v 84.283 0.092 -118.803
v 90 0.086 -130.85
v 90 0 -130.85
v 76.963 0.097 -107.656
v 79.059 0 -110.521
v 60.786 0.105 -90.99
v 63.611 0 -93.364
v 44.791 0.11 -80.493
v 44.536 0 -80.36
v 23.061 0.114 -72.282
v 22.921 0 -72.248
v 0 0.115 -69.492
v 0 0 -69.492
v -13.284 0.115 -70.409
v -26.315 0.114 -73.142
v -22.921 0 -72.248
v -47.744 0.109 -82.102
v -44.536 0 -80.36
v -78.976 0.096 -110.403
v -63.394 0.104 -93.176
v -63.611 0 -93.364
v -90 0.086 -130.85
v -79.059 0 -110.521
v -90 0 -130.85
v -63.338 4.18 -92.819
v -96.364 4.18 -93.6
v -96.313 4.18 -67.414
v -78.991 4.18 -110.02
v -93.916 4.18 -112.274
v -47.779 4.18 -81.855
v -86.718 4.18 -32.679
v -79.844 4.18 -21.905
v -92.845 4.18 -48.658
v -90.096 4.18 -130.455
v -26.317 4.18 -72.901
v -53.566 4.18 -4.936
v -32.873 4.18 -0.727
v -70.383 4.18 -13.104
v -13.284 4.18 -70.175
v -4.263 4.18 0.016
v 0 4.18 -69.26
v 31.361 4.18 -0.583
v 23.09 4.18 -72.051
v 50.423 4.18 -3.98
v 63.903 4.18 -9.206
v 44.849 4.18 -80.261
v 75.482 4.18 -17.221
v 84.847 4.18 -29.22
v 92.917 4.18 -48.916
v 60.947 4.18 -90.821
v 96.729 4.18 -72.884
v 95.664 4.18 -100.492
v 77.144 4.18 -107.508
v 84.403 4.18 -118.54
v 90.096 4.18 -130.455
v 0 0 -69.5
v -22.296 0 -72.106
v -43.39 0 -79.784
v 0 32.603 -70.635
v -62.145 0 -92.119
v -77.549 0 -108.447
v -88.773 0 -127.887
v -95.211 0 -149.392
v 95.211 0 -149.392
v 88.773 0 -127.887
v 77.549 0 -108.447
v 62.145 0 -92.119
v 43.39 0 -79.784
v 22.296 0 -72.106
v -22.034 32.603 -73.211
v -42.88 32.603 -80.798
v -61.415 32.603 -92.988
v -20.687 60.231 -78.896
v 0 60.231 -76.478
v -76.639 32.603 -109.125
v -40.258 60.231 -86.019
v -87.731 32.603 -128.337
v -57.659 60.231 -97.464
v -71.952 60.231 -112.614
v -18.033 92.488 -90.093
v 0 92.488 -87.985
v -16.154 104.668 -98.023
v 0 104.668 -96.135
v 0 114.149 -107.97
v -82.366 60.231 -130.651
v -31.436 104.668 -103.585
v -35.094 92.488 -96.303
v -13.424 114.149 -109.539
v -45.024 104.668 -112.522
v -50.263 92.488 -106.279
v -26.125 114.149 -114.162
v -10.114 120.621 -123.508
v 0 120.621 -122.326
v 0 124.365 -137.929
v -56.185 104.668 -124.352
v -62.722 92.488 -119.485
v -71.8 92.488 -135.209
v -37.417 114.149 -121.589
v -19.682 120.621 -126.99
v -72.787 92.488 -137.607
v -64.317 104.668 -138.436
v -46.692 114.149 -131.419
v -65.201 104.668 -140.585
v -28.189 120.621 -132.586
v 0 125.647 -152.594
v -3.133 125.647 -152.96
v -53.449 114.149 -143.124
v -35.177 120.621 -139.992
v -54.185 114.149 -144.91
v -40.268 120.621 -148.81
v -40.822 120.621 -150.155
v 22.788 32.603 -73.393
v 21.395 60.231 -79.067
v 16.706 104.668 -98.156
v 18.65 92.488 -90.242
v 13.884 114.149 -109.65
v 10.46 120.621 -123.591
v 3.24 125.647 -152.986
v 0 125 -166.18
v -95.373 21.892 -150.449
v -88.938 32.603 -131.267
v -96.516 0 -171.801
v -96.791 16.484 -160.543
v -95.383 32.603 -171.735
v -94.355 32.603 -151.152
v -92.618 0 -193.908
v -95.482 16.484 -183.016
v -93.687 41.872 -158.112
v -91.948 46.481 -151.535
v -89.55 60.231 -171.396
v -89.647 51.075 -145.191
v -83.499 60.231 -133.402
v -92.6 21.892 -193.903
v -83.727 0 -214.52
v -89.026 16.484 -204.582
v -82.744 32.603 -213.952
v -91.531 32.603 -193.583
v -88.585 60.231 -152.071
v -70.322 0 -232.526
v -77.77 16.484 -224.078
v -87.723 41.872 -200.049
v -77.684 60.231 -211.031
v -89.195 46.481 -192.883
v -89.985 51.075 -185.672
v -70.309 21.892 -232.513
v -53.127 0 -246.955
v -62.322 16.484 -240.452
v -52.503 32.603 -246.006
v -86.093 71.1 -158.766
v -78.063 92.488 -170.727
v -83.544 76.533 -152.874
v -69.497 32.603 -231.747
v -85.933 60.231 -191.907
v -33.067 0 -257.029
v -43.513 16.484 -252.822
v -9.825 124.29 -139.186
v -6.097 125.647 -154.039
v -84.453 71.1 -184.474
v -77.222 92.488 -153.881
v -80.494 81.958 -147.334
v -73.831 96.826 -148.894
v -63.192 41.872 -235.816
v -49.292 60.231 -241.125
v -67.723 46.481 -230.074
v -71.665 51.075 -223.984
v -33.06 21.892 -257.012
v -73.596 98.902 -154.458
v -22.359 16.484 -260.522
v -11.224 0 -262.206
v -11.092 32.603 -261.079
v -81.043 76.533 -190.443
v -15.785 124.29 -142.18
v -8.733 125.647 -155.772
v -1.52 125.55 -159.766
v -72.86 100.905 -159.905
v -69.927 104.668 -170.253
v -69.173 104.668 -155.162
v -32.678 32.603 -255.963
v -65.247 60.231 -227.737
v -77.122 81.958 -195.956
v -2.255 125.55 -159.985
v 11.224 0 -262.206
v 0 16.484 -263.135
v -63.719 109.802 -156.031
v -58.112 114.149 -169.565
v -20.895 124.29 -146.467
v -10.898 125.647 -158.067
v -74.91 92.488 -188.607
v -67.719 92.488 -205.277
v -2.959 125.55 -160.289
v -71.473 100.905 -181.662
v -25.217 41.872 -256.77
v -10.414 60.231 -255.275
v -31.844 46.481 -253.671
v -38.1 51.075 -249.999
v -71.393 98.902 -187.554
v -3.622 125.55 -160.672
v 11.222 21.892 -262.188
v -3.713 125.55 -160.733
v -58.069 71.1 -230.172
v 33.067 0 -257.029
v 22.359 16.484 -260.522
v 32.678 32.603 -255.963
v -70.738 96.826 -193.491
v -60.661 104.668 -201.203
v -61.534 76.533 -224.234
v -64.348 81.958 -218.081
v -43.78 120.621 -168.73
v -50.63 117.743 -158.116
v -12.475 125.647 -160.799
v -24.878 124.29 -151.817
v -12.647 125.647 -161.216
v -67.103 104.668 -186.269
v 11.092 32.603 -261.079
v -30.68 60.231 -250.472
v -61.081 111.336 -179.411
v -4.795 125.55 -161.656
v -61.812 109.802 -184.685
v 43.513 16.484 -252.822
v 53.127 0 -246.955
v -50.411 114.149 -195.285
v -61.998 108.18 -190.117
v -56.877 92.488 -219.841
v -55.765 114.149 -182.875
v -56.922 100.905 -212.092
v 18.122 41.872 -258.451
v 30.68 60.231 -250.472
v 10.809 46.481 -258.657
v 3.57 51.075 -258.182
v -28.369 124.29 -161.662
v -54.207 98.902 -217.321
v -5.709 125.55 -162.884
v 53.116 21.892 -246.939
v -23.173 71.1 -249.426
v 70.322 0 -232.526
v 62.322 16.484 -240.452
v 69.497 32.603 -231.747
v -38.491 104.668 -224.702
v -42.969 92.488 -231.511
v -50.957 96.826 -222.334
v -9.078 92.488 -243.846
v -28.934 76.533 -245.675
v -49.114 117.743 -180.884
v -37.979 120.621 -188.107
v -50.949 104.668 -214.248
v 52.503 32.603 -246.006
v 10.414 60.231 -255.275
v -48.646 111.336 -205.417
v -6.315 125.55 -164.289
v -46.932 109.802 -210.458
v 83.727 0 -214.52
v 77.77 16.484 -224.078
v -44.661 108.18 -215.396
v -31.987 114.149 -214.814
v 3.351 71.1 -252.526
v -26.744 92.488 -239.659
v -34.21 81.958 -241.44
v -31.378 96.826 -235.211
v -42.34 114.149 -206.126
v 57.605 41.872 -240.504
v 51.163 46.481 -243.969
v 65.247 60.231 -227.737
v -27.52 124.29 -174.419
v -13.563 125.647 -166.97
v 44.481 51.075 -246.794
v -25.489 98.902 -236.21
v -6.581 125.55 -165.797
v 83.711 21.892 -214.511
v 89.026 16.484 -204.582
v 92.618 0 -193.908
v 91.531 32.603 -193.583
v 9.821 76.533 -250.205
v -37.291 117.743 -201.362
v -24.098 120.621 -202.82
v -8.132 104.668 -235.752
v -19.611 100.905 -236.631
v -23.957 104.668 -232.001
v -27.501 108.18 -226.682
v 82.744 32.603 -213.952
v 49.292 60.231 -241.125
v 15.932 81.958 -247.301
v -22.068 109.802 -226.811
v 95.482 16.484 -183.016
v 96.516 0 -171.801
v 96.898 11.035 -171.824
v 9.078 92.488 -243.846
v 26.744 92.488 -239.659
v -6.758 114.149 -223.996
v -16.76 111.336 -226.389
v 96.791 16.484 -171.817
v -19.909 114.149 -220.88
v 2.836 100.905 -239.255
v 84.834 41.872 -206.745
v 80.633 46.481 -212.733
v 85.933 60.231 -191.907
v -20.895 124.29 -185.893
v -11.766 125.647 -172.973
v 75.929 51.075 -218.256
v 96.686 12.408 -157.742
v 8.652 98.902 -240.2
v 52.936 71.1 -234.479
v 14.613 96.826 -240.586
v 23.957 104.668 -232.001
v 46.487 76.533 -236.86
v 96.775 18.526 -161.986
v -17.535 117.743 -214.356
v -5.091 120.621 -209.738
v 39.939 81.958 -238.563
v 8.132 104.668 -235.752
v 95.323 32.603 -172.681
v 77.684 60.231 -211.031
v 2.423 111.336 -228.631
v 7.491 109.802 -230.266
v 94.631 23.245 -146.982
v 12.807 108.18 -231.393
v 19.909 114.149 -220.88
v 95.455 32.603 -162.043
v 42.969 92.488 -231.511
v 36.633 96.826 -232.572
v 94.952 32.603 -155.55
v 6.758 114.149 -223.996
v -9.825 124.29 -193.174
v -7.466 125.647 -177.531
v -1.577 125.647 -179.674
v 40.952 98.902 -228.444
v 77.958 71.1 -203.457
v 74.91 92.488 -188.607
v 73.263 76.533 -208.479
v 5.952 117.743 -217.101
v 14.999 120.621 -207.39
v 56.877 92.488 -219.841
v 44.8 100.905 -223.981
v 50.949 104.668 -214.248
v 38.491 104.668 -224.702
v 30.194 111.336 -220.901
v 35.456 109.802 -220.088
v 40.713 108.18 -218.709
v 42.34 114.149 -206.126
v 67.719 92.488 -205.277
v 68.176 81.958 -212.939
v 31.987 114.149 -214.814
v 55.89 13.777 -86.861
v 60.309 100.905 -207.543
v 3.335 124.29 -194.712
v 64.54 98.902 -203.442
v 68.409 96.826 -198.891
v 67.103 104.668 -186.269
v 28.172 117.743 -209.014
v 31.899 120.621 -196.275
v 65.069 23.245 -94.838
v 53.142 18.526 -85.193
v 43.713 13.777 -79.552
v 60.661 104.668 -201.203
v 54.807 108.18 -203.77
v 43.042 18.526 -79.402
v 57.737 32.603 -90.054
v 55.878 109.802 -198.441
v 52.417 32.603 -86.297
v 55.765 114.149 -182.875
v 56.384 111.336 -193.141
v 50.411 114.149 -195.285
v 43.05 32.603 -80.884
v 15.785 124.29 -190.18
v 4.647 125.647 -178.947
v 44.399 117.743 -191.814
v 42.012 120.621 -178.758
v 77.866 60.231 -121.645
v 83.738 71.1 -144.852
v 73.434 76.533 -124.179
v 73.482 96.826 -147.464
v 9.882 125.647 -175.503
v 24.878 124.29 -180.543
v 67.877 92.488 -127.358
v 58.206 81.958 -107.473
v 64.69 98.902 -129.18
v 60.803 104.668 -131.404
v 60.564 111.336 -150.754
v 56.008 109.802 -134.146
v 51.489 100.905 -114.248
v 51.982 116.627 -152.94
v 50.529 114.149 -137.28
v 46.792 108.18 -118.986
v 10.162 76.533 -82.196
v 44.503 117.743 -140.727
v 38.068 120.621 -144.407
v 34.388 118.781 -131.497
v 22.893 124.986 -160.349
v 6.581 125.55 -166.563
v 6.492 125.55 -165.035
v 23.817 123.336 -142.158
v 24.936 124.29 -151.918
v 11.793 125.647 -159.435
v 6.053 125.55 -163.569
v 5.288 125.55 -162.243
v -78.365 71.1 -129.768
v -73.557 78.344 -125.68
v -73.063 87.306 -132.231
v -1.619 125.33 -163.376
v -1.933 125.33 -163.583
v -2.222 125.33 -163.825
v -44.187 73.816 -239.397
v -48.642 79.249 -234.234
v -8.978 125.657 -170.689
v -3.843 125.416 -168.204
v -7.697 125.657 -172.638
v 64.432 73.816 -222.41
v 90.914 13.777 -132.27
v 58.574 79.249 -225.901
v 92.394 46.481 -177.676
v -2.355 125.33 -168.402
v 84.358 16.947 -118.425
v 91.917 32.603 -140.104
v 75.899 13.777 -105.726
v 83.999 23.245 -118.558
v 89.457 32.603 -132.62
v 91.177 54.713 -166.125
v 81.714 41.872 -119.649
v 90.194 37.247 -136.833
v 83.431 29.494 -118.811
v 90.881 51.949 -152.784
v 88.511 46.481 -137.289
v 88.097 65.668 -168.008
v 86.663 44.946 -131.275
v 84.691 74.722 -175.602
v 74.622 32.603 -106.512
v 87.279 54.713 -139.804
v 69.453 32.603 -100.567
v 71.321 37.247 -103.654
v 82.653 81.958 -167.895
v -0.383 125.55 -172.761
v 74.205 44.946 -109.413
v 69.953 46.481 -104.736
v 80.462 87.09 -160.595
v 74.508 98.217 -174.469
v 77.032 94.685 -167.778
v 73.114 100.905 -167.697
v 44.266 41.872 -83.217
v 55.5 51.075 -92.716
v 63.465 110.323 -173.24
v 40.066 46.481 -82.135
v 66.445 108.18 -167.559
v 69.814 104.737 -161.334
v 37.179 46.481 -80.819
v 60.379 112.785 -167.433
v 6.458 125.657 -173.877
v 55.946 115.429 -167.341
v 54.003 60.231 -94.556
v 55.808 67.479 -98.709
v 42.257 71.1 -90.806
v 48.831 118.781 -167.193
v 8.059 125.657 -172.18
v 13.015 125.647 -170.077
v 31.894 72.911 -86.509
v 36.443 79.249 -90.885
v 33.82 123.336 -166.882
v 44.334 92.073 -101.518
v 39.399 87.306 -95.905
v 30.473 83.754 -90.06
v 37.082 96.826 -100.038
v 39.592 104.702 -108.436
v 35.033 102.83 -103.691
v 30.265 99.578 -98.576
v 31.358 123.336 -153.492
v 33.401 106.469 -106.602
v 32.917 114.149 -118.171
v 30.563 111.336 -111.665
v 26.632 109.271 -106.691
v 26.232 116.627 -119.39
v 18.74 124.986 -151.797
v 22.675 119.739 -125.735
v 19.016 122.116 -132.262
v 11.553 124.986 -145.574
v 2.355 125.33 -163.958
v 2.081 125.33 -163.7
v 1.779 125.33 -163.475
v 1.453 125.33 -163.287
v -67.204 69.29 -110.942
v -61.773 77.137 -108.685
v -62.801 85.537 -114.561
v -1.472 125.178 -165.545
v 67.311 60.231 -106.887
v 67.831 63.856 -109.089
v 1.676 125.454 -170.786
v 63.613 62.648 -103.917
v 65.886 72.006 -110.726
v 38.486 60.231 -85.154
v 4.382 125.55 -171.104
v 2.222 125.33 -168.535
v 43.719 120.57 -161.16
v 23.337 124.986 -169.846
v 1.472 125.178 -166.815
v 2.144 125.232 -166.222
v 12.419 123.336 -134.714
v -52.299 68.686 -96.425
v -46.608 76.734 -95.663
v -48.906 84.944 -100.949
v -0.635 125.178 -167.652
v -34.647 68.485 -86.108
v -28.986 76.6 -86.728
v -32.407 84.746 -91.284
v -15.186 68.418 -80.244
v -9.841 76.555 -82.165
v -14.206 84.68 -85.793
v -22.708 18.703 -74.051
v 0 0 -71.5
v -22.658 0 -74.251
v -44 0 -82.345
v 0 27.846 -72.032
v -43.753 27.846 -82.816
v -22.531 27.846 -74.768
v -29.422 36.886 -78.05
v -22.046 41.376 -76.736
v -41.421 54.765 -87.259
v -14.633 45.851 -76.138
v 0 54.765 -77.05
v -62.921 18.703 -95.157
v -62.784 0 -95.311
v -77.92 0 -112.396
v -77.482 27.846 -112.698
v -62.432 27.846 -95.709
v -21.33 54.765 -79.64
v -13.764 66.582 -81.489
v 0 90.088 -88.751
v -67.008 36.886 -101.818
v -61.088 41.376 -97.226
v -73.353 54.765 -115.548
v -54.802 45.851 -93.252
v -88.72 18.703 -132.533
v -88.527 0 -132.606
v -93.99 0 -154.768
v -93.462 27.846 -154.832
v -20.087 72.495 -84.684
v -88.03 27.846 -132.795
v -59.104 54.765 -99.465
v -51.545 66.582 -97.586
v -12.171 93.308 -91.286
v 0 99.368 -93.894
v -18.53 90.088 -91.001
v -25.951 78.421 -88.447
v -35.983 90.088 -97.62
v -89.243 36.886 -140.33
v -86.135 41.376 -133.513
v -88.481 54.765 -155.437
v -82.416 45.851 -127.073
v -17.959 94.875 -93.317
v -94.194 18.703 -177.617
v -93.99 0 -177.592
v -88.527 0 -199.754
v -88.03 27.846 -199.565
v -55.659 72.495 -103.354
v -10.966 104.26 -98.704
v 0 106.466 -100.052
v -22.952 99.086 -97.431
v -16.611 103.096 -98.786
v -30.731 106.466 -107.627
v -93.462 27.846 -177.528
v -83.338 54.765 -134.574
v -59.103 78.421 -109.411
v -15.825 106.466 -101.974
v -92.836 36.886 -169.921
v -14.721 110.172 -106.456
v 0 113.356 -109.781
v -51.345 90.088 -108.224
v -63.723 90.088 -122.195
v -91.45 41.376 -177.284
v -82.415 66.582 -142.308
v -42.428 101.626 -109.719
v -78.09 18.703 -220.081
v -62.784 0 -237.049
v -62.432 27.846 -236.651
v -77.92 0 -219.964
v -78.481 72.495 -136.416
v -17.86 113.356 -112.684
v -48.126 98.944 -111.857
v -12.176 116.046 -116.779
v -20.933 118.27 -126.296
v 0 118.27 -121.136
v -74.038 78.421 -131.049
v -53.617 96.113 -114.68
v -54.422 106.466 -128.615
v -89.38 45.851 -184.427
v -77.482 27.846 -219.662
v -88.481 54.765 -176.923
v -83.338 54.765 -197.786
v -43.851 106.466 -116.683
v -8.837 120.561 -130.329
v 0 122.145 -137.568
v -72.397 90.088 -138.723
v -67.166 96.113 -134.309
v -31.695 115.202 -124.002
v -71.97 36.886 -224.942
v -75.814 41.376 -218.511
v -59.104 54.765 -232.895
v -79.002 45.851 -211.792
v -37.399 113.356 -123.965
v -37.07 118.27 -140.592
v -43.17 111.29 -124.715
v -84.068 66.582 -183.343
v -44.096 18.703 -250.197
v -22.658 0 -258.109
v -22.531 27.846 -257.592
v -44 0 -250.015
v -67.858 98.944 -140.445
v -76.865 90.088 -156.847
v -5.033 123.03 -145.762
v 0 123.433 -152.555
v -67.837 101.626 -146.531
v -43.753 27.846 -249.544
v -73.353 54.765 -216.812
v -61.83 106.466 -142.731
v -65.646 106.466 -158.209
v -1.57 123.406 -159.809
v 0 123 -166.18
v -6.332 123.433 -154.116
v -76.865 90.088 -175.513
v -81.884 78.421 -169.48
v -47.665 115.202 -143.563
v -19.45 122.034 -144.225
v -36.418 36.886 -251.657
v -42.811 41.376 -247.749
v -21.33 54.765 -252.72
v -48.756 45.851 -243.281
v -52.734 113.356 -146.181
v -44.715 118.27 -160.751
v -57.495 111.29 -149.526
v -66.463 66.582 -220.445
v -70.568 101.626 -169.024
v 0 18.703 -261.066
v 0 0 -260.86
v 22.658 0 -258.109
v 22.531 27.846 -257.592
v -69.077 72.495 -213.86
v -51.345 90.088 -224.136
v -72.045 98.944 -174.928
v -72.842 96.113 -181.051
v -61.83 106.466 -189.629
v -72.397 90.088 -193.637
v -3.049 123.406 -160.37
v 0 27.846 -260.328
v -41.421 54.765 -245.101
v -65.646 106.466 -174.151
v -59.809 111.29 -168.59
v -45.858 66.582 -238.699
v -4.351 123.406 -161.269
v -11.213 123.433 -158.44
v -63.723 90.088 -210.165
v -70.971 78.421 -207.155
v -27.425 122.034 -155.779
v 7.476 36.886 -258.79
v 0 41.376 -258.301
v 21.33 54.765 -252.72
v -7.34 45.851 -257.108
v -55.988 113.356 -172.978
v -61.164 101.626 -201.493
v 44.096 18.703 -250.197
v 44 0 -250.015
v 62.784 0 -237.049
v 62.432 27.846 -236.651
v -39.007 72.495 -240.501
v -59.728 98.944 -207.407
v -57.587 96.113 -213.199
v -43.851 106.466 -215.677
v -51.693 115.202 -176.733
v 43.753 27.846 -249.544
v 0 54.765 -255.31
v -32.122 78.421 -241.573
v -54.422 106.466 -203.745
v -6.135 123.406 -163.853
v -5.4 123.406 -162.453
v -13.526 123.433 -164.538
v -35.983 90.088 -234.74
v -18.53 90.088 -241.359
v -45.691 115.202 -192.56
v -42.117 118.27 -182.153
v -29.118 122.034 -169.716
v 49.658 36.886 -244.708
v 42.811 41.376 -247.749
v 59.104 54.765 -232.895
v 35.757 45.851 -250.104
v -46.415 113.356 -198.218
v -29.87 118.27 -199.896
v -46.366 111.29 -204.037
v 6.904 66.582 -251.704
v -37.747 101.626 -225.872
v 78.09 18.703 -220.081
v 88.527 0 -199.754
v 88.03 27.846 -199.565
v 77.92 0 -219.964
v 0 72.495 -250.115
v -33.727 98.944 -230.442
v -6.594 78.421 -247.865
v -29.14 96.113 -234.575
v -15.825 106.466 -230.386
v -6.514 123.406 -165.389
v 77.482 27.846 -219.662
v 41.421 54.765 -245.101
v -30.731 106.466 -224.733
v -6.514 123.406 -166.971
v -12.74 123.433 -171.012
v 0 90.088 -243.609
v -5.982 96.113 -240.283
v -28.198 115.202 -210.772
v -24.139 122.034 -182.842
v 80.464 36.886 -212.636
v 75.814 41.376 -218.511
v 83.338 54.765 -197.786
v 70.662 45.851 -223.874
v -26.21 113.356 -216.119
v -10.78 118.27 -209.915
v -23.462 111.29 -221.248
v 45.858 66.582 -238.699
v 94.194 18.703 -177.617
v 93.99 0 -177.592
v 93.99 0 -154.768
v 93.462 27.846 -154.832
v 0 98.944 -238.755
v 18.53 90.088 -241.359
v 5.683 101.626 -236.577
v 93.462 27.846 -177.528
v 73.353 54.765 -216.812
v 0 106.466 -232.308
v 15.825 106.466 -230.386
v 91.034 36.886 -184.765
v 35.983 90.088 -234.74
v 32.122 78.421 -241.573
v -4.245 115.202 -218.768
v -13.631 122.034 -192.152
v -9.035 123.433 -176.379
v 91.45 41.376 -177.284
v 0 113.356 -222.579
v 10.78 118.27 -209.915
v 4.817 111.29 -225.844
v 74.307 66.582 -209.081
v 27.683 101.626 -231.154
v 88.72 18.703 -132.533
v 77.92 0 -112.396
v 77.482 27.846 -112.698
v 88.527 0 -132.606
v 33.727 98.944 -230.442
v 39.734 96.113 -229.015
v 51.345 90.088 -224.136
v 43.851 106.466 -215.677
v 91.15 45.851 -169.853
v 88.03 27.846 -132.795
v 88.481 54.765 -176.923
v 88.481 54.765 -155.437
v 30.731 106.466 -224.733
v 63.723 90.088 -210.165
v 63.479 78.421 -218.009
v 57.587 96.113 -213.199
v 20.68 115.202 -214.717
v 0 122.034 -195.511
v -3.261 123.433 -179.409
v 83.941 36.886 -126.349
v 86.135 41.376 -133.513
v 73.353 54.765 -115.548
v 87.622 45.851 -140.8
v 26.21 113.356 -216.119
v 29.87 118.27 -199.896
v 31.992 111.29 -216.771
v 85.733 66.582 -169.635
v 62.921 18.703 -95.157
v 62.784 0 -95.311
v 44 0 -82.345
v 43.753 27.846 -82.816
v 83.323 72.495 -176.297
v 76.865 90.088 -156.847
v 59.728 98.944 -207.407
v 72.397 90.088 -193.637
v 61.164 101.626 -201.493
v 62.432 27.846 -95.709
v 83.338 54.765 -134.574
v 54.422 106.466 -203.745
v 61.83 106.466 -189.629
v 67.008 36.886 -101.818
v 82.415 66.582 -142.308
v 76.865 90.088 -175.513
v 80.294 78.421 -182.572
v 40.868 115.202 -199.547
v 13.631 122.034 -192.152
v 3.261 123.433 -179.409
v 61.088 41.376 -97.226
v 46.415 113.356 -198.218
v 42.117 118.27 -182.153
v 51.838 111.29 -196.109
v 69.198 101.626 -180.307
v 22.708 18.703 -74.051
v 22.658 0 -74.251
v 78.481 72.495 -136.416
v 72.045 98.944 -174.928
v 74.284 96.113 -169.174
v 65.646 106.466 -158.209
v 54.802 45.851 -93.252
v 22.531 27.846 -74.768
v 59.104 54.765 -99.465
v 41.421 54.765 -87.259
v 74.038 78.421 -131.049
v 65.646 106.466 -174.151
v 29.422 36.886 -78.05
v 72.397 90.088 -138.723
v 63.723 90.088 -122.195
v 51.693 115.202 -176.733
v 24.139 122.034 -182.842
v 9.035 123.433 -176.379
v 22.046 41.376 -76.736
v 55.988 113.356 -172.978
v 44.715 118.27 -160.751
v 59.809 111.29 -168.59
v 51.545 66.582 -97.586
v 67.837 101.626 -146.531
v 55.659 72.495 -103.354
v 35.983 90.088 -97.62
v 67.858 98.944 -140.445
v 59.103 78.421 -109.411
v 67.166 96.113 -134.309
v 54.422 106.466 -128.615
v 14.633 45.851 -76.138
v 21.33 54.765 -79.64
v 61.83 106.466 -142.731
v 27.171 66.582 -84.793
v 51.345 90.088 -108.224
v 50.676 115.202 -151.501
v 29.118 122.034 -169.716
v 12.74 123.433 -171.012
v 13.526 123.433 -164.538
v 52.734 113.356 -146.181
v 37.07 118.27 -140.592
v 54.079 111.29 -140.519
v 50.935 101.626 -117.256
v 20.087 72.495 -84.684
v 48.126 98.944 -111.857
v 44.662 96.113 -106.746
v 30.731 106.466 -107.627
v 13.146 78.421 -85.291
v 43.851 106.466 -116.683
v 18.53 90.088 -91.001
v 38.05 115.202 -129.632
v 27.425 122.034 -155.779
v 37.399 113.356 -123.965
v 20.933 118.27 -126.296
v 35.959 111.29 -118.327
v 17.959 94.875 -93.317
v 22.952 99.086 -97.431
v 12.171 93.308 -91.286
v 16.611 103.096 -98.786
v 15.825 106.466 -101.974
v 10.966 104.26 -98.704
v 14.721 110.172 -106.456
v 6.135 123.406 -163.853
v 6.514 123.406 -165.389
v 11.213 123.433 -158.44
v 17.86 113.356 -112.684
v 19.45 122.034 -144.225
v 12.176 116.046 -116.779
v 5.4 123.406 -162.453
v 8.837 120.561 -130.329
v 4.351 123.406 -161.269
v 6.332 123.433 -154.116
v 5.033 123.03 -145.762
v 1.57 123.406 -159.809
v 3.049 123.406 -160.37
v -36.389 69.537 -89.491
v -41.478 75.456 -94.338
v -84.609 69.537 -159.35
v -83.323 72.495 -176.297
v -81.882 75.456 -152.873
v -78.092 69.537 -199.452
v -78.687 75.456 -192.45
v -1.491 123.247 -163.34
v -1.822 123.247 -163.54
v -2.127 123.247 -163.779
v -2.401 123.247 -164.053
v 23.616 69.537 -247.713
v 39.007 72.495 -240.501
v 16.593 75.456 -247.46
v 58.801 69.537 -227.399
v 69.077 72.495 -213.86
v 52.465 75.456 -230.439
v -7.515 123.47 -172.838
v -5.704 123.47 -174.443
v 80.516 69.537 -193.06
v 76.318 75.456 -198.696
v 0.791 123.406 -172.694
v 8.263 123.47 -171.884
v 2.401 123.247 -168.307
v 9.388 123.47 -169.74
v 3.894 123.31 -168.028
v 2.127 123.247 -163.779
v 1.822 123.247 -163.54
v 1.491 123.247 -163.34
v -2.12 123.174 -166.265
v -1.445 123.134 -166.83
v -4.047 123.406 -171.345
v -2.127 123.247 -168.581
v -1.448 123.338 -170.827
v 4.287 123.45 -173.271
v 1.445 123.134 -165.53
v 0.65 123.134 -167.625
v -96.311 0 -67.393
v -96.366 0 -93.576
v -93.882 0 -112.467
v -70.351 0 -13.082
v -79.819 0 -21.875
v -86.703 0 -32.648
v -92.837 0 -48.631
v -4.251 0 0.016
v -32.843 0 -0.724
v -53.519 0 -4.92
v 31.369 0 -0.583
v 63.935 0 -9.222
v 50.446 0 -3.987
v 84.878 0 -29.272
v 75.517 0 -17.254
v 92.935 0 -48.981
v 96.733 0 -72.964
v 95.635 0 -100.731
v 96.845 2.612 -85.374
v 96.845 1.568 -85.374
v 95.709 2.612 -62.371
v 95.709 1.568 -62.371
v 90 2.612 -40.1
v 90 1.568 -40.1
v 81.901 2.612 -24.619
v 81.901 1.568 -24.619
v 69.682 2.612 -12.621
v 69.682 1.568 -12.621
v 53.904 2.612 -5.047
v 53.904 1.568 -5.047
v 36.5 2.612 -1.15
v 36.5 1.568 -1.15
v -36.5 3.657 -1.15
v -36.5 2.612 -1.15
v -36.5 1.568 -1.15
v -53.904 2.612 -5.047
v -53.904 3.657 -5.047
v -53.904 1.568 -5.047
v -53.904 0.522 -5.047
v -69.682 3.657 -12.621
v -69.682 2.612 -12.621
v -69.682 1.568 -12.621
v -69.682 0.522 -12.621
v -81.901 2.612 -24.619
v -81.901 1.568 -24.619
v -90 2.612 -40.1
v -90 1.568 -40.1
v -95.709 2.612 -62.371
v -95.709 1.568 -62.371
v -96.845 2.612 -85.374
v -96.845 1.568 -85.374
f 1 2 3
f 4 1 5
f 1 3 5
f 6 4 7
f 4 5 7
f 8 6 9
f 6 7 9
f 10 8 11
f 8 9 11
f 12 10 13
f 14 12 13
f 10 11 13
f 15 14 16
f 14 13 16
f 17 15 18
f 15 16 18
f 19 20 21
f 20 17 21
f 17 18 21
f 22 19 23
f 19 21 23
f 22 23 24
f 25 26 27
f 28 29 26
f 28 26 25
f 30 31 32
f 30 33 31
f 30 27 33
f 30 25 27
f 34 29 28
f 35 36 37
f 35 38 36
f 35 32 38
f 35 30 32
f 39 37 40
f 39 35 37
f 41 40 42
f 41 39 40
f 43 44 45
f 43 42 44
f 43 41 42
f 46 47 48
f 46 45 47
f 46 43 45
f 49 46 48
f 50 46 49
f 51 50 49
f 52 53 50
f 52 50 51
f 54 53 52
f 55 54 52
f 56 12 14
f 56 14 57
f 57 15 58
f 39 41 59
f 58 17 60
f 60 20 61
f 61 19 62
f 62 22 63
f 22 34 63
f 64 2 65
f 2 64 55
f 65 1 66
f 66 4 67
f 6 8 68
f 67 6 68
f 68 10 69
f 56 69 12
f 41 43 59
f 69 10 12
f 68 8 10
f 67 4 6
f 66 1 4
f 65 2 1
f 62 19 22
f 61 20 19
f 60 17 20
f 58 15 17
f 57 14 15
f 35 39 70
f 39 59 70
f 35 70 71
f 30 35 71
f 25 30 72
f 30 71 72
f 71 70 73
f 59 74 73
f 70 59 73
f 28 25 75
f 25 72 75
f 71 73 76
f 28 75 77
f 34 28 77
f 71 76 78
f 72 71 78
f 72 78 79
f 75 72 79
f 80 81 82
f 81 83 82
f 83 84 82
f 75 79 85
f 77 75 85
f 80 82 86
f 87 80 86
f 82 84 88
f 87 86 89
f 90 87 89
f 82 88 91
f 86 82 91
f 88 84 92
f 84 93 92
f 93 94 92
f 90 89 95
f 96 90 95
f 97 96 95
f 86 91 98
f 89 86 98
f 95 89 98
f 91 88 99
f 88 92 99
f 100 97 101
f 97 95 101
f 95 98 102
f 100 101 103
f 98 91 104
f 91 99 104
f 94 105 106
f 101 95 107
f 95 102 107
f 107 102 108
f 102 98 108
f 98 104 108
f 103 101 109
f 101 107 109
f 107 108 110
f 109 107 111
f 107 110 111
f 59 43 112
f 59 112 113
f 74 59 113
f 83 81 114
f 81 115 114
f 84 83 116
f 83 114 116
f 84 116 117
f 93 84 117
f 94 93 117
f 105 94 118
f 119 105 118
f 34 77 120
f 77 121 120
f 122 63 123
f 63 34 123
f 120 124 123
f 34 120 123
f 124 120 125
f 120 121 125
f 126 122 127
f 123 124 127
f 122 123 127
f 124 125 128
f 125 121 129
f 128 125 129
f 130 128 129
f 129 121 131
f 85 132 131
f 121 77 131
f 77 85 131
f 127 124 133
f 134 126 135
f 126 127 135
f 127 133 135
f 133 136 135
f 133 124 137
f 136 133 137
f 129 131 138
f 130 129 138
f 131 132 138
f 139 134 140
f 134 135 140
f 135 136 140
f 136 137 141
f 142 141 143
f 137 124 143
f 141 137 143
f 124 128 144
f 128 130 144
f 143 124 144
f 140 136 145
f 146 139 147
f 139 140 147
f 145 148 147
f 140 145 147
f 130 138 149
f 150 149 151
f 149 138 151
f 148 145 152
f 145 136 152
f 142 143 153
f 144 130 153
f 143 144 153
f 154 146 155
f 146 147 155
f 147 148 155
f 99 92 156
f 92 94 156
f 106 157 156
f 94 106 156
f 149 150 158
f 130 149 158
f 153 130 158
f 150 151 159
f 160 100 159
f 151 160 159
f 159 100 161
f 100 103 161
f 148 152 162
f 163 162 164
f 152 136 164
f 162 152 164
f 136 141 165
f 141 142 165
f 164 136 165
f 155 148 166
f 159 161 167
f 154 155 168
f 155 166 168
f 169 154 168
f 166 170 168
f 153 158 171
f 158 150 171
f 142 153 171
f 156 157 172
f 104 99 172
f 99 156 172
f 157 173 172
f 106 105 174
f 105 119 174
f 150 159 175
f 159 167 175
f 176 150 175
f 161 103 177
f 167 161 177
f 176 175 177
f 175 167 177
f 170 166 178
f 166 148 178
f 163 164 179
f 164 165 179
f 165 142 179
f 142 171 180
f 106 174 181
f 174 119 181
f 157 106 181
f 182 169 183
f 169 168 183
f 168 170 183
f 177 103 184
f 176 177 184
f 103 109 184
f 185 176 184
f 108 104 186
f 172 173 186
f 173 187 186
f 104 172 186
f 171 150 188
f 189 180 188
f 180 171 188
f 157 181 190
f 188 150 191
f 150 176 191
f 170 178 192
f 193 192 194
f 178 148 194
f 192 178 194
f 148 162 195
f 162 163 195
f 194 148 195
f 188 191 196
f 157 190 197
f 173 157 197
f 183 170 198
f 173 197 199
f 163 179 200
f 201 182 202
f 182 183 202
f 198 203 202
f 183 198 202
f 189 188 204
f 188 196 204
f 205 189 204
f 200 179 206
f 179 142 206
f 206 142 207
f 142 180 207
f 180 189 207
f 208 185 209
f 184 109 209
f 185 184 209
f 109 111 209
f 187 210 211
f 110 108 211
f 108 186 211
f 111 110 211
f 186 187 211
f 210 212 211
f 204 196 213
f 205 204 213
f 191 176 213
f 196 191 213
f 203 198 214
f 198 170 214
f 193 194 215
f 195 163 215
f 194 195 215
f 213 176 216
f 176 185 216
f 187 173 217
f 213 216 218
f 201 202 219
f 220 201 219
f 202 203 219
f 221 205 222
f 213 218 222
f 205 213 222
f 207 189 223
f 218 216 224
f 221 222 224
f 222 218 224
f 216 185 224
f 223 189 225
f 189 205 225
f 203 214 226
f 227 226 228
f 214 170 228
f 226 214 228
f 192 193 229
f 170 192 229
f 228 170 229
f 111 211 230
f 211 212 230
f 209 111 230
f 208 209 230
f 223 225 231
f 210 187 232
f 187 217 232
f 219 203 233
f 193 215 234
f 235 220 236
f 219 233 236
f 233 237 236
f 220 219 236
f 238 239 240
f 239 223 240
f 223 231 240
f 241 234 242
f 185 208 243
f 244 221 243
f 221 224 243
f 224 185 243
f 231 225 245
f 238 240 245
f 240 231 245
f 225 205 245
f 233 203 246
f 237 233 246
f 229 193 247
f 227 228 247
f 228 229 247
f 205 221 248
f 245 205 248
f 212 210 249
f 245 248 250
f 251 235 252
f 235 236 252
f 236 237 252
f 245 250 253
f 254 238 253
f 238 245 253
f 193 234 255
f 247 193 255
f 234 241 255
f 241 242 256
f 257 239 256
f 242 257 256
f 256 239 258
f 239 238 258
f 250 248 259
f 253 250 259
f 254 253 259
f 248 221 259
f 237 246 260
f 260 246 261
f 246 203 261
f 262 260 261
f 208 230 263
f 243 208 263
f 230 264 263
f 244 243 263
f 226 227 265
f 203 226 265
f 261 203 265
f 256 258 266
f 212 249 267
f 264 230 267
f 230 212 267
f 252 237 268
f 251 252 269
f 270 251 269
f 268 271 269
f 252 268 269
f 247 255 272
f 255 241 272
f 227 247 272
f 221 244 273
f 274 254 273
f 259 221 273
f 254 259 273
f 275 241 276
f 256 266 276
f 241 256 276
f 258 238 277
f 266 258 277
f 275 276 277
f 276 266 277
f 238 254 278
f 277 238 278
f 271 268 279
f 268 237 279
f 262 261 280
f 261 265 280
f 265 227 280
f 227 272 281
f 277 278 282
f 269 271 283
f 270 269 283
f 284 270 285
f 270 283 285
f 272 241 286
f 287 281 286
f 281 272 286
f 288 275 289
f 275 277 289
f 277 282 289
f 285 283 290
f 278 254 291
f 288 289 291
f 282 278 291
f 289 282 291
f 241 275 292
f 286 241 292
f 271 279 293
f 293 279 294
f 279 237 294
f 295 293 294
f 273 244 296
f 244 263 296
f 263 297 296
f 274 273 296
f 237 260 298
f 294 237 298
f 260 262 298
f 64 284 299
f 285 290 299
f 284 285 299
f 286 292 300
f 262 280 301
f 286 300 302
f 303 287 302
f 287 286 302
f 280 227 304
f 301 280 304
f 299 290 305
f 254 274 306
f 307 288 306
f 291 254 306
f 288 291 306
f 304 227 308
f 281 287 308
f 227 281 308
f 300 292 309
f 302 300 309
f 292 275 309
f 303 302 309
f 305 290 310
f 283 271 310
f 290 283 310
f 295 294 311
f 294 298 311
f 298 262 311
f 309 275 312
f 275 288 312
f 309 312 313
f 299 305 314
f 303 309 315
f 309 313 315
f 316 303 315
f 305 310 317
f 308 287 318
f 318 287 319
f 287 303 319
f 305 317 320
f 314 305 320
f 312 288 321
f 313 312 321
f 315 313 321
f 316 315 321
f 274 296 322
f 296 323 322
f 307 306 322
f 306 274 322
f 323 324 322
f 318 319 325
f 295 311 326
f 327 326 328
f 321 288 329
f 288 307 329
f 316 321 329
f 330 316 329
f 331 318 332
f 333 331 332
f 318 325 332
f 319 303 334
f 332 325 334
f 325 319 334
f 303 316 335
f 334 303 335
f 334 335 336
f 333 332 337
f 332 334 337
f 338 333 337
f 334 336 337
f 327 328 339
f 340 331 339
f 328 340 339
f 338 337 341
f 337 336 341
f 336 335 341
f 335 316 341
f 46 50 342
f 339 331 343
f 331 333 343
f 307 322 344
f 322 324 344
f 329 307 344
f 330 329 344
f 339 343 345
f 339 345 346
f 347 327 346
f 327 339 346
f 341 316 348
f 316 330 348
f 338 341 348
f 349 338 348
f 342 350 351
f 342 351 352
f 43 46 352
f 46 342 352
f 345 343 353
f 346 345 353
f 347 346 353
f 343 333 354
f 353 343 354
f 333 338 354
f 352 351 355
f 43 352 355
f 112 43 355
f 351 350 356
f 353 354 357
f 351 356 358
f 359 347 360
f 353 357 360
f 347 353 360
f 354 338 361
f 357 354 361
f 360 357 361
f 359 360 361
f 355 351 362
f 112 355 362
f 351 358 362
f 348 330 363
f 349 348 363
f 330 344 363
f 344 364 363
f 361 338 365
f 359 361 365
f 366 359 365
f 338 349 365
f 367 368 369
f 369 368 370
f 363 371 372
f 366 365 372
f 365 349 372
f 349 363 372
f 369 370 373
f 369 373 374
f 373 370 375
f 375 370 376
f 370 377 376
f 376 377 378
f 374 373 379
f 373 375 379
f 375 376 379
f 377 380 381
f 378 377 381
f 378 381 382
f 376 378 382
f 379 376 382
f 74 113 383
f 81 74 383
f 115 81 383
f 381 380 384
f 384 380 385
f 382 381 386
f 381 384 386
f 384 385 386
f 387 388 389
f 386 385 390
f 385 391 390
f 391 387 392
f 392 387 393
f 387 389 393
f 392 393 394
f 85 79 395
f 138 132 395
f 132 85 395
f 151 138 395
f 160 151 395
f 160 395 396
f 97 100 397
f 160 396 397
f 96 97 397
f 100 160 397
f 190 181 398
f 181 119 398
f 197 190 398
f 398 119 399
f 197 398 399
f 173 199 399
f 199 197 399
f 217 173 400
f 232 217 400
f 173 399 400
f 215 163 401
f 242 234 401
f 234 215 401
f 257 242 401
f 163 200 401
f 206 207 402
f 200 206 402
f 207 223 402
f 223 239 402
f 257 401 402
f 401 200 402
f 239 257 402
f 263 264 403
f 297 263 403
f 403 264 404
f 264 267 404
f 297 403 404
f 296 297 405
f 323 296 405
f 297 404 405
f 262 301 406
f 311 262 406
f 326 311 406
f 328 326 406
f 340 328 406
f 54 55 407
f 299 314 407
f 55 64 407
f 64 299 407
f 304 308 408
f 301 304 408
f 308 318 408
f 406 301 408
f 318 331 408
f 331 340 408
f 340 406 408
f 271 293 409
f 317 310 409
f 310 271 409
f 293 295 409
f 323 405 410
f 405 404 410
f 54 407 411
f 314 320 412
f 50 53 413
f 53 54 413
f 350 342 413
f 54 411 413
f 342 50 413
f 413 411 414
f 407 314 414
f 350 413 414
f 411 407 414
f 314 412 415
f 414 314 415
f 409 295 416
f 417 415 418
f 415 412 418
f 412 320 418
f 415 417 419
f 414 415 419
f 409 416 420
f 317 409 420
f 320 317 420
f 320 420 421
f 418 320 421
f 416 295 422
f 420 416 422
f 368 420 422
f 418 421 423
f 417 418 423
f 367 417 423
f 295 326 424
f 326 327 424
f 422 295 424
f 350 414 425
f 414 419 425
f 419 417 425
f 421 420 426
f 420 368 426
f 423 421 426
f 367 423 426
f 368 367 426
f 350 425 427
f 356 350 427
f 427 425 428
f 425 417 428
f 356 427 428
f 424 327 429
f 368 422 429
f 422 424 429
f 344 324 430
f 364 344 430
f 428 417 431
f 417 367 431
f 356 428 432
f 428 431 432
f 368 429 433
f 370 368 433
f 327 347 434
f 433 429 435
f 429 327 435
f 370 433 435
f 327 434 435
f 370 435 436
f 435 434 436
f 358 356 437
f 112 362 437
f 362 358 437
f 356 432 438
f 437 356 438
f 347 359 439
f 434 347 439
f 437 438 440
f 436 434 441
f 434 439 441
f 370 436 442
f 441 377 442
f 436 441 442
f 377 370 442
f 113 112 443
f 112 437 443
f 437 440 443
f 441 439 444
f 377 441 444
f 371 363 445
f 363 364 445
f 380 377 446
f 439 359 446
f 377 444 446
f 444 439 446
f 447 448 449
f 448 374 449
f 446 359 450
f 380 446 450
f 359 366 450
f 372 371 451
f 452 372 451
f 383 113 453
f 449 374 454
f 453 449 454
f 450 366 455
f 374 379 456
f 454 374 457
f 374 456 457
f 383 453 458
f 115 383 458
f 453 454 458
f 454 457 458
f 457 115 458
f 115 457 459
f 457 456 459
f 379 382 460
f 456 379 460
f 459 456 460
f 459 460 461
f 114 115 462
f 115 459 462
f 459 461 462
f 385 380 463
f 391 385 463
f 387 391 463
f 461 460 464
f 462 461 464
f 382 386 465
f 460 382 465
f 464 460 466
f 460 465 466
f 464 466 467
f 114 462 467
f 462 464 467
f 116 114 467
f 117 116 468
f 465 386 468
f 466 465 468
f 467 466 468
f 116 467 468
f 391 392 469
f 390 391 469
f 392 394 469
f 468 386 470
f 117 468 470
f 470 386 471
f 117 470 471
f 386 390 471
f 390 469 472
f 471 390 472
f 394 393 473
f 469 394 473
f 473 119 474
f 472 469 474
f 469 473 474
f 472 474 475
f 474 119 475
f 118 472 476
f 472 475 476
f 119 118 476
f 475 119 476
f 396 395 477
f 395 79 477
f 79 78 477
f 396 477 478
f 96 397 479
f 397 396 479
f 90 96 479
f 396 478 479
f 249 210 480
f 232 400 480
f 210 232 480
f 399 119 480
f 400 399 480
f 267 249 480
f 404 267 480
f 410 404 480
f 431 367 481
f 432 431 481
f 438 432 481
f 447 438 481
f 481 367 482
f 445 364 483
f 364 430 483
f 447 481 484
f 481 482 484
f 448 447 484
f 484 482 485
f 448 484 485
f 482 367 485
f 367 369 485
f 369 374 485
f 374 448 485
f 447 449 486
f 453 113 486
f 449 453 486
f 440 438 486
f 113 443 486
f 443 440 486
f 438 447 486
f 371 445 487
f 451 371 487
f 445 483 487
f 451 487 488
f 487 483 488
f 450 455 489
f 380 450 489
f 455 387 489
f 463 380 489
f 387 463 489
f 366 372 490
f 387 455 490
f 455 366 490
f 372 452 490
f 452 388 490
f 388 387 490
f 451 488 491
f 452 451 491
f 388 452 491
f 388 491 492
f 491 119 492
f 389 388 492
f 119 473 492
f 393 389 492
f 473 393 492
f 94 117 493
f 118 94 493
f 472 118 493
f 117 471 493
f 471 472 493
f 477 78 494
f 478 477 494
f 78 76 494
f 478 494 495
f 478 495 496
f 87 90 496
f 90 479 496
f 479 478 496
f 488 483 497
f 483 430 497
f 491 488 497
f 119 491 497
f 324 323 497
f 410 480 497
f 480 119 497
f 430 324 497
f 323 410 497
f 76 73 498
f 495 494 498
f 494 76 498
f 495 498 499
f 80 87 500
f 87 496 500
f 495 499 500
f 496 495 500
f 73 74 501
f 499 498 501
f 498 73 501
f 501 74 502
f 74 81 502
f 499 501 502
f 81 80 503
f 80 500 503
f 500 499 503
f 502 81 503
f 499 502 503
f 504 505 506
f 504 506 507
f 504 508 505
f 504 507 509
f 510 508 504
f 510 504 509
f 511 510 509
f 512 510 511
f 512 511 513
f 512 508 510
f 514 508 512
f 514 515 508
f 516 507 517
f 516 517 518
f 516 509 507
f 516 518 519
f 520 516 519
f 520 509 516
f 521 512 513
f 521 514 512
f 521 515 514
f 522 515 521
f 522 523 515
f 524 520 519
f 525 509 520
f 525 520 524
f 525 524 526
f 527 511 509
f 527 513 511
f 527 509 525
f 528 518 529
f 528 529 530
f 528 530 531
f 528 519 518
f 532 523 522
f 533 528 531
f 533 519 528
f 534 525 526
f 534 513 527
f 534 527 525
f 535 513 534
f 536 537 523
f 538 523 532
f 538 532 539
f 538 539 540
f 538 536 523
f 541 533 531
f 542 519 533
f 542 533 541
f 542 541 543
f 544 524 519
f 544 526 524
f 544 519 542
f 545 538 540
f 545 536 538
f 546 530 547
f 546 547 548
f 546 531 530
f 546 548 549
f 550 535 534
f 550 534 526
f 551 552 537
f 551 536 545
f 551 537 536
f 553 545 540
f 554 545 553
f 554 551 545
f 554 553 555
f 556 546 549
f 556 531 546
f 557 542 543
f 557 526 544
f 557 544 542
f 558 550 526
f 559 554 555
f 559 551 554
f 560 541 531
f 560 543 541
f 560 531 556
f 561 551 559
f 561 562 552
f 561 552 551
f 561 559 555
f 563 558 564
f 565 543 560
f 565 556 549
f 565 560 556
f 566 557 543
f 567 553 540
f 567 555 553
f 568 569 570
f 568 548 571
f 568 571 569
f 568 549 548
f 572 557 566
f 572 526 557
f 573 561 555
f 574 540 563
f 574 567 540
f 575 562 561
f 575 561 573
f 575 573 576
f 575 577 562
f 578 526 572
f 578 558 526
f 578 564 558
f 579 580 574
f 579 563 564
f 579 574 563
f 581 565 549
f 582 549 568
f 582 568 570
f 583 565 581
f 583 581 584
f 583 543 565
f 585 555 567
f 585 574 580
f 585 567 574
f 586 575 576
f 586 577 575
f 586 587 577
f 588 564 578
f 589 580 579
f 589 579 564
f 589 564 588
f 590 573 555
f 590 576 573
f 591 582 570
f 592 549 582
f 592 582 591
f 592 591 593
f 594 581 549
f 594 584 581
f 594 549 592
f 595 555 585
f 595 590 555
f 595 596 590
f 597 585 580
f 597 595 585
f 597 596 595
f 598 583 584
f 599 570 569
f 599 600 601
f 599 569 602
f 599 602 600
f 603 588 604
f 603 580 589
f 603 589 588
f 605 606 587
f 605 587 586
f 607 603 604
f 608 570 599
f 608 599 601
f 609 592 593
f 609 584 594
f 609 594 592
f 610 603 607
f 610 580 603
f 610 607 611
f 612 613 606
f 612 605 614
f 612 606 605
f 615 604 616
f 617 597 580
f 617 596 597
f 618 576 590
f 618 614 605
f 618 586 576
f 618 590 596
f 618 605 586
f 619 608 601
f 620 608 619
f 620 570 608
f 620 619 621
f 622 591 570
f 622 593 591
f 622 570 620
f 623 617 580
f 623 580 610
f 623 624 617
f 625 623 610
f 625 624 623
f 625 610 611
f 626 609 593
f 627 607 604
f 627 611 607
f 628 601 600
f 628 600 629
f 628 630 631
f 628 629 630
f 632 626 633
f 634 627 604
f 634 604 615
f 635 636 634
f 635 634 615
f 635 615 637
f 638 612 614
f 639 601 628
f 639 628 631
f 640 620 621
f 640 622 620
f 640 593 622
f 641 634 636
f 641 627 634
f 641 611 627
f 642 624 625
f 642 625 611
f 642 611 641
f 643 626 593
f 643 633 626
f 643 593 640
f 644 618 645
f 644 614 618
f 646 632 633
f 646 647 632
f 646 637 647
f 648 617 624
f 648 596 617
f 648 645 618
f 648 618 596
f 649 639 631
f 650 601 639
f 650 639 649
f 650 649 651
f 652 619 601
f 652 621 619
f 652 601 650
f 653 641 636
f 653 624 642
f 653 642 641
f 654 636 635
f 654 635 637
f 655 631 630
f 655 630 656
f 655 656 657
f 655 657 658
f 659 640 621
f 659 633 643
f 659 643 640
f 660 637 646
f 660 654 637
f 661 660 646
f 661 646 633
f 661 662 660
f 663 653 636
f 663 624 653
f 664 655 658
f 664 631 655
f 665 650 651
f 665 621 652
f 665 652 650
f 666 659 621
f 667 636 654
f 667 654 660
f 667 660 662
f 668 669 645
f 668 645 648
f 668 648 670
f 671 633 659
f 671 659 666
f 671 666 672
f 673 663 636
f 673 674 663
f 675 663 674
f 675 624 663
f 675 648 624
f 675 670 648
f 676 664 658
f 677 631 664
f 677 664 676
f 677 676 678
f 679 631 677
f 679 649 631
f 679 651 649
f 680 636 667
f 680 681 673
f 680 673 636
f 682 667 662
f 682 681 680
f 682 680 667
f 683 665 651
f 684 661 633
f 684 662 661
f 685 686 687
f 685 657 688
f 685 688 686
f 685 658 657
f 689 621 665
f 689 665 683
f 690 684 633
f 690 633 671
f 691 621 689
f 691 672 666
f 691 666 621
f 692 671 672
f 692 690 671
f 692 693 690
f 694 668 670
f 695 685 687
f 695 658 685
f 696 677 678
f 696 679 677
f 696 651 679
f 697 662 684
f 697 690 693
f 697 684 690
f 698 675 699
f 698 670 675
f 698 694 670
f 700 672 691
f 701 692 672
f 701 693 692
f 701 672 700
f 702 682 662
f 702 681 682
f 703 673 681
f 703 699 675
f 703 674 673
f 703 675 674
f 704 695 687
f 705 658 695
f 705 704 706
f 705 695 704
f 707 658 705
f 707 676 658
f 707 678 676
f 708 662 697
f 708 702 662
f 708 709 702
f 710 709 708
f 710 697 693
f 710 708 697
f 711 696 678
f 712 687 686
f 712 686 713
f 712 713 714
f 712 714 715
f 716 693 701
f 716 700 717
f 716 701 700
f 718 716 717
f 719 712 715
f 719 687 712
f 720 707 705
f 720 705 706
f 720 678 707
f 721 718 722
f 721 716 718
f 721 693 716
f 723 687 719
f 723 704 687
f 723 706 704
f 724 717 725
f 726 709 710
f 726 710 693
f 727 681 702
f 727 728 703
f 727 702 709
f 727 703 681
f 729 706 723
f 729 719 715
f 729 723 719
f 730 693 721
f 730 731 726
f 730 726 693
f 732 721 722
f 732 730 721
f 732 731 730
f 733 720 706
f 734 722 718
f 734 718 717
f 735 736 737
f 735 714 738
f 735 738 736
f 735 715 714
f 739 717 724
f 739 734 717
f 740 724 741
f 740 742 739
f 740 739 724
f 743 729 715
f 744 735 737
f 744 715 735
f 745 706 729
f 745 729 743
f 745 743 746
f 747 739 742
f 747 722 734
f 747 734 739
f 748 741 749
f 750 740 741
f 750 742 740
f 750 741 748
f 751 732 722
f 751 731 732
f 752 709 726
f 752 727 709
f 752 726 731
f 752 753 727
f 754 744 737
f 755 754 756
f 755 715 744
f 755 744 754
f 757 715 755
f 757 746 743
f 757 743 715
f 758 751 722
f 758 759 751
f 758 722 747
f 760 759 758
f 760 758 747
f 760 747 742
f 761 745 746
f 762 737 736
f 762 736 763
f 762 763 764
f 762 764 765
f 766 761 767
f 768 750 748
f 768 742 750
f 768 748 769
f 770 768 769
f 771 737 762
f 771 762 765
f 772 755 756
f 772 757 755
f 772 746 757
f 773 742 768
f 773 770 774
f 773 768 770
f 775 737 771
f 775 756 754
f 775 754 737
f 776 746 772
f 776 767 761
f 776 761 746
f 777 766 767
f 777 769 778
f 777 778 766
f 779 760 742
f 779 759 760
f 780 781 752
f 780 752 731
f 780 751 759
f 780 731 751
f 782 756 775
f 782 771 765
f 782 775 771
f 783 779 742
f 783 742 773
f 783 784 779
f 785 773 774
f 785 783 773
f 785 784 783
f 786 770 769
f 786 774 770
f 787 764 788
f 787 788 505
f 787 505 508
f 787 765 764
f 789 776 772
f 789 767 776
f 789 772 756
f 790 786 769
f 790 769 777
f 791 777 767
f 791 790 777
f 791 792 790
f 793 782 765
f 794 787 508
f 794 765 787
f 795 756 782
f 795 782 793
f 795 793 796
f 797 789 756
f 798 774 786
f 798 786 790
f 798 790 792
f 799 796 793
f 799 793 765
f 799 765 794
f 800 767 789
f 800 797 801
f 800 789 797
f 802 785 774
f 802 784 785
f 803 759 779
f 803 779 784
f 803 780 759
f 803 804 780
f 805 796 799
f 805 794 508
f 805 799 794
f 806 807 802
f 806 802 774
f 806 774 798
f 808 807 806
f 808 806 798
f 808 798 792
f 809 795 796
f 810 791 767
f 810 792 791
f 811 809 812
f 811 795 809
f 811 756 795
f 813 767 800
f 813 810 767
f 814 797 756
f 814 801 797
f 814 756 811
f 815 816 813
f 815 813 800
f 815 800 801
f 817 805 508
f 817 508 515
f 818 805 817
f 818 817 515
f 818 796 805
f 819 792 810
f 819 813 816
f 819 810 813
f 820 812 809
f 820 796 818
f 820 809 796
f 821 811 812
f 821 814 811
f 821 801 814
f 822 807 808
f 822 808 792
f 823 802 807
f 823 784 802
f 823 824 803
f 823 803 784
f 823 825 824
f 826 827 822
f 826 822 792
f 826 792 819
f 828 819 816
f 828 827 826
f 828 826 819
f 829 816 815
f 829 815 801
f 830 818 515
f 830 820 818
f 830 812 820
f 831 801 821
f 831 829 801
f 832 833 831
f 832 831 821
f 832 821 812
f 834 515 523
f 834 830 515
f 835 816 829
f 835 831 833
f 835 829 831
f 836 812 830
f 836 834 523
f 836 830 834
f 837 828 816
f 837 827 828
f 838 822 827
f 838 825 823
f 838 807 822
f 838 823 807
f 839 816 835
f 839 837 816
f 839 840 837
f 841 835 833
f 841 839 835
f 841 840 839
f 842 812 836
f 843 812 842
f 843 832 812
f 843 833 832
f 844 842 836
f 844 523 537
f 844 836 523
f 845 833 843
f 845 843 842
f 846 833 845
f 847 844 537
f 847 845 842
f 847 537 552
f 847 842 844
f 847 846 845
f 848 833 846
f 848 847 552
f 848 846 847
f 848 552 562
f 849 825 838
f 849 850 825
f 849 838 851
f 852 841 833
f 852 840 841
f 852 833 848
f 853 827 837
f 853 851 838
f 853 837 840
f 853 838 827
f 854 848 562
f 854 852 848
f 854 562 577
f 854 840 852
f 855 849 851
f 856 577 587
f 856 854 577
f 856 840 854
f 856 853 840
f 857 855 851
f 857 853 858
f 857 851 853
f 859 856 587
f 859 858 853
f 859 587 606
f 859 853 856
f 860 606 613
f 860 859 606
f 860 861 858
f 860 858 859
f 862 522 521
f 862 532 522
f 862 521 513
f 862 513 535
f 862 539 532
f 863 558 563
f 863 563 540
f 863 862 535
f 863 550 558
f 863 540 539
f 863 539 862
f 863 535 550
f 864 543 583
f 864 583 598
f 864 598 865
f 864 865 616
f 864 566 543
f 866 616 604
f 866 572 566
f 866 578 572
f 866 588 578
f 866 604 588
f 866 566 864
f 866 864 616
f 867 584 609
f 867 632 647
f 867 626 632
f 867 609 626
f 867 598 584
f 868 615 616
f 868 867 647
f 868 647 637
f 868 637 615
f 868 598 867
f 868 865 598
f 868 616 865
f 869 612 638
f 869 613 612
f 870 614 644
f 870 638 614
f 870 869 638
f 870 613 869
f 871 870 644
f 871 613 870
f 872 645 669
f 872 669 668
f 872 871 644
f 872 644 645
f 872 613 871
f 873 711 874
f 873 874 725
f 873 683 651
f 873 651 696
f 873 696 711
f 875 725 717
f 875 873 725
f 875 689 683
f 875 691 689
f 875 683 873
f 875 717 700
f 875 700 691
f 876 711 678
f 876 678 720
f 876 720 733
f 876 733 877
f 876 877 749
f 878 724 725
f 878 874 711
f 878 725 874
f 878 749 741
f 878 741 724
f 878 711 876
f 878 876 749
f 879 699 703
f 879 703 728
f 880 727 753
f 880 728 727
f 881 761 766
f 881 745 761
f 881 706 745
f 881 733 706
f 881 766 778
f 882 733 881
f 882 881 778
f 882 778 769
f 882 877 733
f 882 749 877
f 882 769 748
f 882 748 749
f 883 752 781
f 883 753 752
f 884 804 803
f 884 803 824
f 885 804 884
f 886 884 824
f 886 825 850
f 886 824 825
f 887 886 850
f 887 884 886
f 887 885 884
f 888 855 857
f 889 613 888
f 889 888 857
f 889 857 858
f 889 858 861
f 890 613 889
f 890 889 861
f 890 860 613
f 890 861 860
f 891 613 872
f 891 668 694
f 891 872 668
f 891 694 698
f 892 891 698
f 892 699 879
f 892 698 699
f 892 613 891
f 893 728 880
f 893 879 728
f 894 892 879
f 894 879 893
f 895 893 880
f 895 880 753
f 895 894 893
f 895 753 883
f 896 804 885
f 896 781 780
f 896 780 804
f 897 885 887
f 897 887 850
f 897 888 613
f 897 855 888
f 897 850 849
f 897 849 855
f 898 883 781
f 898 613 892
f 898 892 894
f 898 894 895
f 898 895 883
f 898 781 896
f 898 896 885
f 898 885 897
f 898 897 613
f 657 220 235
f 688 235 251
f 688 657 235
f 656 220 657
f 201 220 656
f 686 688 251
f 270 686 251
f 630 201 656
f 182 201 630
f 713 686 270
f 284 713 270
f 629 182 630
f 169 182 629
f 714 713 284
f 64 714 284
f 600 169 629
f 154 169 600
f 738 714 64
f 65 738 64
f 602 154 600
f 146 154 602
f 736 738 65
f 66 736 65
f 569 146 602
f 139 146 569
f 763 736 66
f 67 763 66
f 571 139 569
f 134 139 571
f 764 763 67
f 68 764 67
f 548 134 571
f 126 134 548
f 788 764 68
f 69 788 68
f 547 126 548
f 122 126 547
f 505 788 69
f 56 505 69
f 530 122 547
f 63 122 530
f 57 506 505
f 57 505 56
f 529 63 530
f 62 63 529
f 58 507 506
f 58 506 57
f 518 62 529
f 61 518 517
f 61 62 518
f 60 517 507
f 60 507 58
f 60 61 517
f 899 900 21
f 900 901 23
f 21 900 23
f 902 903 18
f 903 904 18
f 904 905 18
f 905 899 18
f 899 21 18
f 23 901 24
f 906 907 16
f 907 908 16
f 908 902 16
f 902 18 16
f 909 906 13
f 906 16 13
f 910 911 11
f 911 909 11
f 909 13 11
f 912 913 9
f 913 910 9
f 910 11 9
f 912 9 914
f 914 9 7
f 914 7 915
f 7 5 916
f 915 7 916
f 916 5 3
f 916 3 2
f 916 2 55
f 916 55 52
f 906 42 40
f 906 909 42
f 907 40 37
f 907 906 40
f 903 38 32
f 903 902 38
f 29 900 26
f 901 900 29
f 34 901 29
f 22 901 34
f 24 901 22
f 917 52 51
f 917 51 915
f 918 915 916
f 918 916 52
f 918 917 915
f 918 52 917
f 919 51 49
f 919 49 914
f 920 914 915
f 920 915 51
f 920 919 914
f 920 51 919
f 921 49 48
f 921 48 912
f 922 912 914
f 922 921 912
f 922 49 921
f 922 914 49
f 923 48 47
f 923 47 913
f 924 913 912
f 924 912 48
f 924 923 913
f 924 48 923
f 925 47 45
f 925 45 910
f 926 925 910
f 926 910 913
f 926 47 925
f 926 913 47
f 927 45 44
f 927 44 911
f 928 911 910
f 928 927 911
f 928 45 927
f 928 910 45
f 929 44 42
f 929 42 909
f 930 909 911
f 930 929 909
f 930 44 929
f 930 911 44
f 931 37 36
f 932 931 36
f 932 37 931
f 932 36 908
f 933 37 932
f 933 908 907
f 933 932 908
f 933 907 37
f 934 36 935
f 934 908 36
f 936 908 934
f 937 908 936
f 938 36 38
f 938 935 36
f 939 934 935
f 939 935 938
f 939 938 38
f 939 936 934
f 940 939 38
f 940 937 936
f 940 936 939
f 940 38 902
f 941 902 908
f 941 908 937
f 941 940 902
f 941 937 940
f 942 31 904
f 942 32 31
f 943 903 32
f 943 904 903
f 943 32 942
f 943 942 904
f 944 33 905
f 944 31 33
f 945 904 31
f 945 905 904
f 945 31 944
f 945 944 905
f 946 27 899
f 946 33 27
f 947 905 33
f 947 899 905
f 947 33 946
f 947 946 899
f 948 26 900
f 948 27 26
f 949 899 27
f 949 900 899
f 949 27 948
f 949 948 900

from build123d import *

# Parameters (mm, degrees)
BOSS_EXTRUDE3_DEPTH = 4.18


with BuildPart() as part:
    # Sketch7 → Boss-Extrude3 (new body)
    with BuildSketch(Plane(origin=(0, 0, 0), x_dir=(1, 0, 0), z_dir=(0, 1, 0))):
        with BuildLine():
            ThreePointArc((90, 130.85), (0, 69.491797485), (-90, 130.85))
            add(Edge.make_bspline(
                [(90, 130.85), (97.079309669, 101.675750549), (102.319849387, 59.849101433), (75.220880882, 11.004804432), (38.530319517, -1.069799314), (0, 0.48833618), (-38.530319517, -1.069799314), (-75.220880882, 11.004804432), (-102.319849387, 59.849101433), (-97.079309669, 101.675750549), (-90, 130.85)],
                knots=[0, 0, 0, 0, 0.232377867, 0.29749861, 0.407563265, 0.5, 0.592436735, 0.70250139, 0.767622133, 1, 1, 1, 1], degree=3))
        make_face()
    extrude(amount=BOSS_EXTRUDE3_DEPTH)

    # Sketch9 → Revolve2 (revolve)
    with BuildSketch(Plane(origin=(0, 0, 0), x_dir=(0, 0, -1), z_dir=(1, 0, 0))):
        with BuildLine():
            Line((166.18, 123), (166.18, 125))
            add(Edge.make_bspline(
                [(69.5, 0), (67.581883296, 26.850728663), (75.089030326, 61.070732906), (98.263786833, 120.341869465), (143.498400828, 127.741871184), (166.18, 125)],
                knots=[0, 0, 0, 0, 0.425686615, 0.582159448, 1, 1, 1, 1], degree=3))
            Line((69.5, 0), (71.5, 0))
            add(Edge.make_bspline(
                [(71.5, 0), (69.486543186, 26.977314441), (77.256481199, 60.848403614), (99.616333352, 119.860936938), (144.968117819, 124.95889538), (166.18, 123)],
                knots=[0, 0, 0, 0, 0.43212024, 0.59095793, 1, 1, 1, 1], degree=3))
        make_face()
    revolve(axis=Axis((0, 125, -166.18), (0, -1, 0)))


solid = part.part
